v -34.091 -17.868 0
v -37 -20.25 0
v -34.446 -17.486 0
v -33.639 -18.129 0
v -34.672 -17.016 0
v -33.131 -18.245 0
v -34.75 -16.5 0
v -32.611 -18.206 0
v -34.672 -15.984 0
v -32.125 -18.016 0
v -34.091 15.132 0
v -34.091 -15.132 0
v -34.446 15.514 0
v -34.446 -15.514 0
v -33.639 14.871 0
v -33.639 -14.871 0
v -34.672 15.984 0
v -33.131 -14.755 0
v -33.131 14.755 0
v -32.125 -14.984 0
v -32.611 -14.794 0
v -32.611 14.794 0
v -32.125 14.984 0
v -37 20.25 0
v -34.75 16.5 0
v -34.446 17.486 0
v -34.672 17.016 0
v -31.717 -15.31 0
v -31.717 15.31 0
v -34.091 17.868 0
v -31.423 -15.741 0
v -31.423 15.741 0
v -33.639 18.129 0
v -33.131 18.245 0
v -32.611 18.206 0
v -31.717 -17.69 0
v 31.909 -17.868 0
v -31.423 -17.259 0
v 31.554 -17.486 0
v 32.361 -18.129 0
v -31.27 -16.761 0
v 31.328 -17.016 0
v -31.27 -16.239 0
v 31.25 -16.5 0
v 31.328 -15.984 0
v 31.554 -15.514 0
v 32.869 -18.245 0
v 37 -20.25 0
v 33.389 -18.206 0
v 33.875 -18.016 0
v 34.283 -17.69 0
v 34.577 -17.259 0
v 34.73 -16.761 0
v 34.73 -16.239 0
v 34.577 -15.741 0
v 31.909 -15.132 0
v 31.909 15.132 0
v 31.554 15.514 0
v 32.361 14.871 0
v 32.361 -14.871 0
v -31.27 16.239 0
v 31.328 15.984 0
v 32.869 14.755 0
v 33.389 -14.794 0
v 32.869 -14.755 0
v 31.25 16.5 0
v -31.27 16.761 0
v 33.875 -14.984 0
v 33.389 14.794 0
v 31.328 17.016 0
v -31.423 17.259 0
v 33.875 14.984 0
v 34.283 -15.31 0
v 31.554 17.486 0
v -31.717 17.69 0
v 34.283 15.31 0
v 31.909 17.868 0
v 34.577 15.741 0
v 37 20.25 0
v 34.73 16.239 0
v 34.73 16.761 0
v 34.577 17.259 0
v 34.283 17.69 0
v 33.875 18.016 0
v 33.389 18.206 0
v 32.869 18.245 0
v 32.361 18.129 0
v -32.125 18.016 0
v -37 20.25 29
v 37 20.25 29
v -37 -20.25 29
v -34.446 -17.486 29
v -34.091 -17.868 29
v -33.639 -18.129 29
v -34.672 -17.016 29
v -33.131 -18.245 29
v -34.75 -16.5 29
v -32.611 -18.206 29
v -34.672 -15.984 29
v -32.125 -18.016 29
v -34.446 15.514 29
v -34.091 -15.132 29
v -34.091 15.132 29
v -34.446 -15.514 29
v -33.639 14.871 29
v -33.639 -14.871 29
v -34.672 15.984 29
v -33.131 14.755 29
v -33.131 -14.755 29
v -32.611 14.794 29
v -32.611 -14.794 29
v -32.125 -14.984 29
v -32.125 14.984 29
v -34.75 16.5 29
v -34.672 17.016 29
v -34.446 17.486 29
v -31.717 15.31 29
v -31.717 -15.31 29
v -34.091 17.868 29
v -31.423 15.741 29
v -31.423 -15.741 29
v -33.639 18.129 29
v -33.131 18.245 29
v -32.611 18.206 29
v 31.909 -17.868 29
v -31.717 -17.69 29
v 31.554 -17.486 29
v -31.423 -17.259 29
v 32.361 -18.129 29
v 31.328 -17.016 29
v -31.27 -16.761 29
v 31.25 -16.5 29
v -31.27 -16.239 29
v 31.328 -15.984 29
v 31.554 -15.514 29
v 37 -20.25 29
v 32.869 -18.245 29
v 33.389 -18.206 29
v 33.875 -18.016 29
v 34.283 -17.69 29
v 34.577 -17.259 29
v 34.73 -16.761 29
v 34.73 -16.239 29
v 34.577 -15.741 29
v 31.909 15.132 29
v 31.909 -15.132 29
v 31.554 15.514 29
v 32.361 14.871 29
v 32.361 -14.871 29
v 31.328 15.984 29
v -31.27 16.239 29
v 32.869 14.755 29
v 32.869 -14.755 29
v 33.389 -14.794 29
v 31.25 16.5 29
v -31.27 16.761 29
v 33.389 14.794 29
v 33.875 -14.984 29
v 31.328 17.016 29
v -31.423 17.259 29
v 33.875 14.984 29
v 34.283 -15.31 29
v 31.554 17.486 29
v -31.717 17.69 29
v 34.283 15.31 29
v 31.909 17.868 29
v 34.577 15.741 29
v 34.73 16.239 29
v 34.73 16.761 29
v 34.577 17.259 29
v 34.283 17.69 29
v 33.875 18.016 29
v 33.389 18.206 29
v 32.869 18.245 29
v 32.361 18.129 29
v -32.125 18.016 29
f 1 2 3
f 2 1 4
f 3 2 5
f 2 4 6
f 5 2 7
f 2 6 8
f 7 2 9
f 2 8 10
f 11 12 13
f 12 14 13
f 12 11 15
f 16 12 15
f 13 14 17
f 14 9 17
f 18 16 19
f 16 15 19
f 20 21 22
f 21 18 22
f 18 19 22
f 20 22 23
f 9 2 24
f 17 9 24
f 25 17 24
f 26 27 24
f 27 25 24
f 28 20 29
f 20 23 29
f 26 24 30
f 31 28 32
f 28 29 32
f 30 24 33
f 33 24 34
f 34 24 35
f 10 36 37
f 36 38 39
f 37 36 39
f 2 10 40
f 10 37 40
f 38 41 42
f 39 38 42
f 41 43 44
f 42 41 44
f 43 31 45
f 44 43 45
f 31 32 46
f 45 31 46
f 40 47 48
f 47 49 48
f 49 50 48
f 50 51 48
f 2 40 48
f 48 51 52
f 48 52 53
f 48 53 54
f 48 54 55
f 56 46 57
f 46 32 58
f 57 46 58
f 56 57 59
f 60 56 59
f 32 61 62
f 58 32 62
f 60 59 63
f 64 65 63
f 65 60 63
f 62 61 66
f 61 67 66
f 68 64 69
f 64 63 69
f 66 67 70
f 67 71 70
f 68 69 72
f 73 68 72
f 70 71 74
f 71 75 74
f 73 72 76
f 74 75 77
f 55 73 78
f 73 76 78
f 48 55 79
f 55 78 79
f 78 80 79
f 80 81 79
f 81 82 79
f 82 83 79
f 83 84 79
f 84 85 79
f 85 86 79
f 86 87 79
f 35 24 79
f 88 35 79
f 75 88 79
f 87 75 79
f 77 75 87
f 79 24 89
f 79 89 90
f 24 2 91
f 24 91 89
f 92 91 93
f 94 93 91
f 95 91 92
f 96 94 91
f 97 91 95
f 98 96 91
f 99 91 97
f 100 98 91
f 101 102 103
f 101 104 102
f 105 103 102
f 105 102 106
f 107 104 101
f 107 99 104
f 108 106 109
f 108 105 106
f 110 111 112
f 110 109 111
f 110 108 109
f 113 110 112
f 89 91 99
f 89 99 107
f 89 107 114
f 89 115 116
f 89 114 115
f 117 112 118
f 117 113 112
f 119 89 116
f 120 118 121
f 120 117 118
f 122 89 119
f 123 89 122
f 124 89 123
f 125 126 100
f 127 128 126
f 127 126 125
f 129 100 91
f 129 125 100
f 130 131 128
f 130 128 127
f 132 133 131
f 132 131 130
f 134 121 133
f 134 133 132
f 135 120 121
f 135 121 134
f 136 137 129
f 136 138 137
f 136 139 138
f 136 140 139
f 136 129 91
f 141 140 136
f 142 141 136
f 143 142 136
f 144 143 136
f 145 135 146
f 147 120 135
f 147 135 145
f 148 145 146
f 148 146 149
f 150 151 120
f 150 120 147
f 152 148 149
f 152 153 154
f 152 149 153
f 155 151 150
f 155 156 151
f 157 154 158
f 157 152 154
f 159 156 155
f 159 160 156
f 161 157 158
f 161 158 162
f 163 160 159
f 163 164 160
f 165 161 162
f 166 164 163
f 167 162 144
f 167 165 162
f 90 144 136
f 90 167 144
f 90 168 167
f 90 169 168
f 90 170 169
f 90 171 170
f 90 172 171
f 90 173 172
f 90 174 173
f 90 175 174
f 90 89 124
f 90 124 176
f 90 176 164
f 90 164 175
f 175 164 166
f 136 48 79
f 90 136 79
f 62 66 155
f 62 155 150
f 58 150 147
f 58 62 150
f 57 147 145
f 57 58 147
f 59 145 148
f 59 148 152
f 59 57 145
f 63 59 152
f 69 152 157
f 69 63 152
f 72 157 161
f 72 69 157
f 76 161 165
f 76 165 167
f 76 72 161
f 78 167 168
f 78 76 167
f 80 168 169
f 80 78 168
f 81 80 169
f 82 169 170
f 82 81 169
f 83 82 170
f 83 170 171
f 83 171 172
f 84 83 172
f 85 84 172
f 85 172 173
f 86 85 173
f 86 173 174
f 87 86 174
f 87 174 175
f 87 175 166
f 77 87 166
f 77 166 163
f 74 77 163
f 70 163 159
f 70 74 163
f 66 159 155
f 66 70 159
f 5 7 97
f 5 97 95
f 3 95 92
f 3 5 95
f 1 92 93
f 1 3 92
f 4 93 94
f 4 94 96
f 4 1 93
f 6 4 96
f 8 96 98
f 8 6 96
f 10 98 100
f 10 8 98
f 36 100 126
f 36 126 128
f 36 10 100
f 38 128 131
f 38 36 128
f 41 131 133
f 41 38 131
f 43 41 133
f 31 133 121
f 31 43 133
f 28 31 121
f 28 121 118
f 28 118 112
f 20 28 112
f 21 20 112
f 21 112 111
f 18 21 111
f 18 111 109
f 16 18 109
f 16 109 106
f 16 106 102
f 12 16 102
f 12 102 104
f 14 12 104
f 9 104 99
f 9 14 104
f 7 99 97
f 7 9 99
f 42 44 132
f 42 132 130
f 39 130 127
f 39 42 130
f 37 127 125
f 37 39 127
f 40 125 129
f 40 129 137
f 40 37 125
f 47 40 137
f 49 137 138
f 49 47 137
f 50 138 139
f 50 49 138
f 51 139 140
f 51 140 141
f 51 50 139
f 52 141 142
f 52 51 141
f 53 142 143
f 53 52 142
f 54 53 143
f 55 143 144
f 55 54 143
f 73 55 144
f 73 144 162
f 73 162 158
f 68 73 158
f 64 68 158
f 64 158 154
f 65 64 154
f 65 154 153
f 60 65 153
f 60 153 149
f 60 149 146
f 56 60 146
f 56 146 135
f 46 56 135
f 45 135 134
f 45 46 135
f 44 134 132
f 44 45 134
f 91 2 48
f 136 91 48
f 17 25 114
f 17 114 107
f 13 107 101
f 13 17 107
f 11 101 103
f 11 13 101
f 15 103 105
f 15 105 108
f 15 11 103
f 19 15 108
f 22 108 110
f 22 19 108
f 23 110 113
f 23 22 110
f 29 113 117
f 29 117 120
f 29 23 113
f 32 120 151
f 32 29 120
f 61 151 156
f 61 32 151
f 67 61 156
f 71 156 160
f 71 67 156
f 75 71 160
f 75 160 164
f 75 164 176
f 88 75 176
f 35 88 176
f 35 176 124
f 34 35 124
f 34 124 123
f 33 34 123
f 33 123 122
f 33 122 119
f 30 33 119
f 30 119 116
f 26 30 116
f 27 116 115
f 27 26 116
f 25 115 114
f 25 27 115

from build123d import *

# Parameters (mm, degrees)
SKETCH_1_W      = 74
SKETCH_1_H      = 40.5
SKETCH_1_R      = 1.75
EXTRUDE_1_DEPTH = 29


with BuildPart() as part:
    # 草圖1 → 伸長1 (new body)
    with BuildSketch(Plane.XY):
        Rectangle(SKETCH_1_W, SKETCH_1_H)
        with Locations(Location((-33, 16.5, 0), (0, 0, 180))):
            Circle(SKETCH_1_R, mode=Mode.SUBTRACT)
        with Locations(Location((-33, -16.5, 0), (0, 0, 180))):
            Circle(SKETCH_1_R, mode=Mode.SUBTRACT)
        with Locations(Location((33, -16.5, 0), (0, 0, 180))):
            Circle(SKETCH_1_R, mode=Mode.SUBTRACT)
        with Locations(Location((33, 16.5, 0), (0, 0, 180))):
            Circle(SKETCH_1_R, mode=Mode.SUBTRACT)
    extrude(amount=EXTRUDE_1_DEPTH)


solid = part.part
